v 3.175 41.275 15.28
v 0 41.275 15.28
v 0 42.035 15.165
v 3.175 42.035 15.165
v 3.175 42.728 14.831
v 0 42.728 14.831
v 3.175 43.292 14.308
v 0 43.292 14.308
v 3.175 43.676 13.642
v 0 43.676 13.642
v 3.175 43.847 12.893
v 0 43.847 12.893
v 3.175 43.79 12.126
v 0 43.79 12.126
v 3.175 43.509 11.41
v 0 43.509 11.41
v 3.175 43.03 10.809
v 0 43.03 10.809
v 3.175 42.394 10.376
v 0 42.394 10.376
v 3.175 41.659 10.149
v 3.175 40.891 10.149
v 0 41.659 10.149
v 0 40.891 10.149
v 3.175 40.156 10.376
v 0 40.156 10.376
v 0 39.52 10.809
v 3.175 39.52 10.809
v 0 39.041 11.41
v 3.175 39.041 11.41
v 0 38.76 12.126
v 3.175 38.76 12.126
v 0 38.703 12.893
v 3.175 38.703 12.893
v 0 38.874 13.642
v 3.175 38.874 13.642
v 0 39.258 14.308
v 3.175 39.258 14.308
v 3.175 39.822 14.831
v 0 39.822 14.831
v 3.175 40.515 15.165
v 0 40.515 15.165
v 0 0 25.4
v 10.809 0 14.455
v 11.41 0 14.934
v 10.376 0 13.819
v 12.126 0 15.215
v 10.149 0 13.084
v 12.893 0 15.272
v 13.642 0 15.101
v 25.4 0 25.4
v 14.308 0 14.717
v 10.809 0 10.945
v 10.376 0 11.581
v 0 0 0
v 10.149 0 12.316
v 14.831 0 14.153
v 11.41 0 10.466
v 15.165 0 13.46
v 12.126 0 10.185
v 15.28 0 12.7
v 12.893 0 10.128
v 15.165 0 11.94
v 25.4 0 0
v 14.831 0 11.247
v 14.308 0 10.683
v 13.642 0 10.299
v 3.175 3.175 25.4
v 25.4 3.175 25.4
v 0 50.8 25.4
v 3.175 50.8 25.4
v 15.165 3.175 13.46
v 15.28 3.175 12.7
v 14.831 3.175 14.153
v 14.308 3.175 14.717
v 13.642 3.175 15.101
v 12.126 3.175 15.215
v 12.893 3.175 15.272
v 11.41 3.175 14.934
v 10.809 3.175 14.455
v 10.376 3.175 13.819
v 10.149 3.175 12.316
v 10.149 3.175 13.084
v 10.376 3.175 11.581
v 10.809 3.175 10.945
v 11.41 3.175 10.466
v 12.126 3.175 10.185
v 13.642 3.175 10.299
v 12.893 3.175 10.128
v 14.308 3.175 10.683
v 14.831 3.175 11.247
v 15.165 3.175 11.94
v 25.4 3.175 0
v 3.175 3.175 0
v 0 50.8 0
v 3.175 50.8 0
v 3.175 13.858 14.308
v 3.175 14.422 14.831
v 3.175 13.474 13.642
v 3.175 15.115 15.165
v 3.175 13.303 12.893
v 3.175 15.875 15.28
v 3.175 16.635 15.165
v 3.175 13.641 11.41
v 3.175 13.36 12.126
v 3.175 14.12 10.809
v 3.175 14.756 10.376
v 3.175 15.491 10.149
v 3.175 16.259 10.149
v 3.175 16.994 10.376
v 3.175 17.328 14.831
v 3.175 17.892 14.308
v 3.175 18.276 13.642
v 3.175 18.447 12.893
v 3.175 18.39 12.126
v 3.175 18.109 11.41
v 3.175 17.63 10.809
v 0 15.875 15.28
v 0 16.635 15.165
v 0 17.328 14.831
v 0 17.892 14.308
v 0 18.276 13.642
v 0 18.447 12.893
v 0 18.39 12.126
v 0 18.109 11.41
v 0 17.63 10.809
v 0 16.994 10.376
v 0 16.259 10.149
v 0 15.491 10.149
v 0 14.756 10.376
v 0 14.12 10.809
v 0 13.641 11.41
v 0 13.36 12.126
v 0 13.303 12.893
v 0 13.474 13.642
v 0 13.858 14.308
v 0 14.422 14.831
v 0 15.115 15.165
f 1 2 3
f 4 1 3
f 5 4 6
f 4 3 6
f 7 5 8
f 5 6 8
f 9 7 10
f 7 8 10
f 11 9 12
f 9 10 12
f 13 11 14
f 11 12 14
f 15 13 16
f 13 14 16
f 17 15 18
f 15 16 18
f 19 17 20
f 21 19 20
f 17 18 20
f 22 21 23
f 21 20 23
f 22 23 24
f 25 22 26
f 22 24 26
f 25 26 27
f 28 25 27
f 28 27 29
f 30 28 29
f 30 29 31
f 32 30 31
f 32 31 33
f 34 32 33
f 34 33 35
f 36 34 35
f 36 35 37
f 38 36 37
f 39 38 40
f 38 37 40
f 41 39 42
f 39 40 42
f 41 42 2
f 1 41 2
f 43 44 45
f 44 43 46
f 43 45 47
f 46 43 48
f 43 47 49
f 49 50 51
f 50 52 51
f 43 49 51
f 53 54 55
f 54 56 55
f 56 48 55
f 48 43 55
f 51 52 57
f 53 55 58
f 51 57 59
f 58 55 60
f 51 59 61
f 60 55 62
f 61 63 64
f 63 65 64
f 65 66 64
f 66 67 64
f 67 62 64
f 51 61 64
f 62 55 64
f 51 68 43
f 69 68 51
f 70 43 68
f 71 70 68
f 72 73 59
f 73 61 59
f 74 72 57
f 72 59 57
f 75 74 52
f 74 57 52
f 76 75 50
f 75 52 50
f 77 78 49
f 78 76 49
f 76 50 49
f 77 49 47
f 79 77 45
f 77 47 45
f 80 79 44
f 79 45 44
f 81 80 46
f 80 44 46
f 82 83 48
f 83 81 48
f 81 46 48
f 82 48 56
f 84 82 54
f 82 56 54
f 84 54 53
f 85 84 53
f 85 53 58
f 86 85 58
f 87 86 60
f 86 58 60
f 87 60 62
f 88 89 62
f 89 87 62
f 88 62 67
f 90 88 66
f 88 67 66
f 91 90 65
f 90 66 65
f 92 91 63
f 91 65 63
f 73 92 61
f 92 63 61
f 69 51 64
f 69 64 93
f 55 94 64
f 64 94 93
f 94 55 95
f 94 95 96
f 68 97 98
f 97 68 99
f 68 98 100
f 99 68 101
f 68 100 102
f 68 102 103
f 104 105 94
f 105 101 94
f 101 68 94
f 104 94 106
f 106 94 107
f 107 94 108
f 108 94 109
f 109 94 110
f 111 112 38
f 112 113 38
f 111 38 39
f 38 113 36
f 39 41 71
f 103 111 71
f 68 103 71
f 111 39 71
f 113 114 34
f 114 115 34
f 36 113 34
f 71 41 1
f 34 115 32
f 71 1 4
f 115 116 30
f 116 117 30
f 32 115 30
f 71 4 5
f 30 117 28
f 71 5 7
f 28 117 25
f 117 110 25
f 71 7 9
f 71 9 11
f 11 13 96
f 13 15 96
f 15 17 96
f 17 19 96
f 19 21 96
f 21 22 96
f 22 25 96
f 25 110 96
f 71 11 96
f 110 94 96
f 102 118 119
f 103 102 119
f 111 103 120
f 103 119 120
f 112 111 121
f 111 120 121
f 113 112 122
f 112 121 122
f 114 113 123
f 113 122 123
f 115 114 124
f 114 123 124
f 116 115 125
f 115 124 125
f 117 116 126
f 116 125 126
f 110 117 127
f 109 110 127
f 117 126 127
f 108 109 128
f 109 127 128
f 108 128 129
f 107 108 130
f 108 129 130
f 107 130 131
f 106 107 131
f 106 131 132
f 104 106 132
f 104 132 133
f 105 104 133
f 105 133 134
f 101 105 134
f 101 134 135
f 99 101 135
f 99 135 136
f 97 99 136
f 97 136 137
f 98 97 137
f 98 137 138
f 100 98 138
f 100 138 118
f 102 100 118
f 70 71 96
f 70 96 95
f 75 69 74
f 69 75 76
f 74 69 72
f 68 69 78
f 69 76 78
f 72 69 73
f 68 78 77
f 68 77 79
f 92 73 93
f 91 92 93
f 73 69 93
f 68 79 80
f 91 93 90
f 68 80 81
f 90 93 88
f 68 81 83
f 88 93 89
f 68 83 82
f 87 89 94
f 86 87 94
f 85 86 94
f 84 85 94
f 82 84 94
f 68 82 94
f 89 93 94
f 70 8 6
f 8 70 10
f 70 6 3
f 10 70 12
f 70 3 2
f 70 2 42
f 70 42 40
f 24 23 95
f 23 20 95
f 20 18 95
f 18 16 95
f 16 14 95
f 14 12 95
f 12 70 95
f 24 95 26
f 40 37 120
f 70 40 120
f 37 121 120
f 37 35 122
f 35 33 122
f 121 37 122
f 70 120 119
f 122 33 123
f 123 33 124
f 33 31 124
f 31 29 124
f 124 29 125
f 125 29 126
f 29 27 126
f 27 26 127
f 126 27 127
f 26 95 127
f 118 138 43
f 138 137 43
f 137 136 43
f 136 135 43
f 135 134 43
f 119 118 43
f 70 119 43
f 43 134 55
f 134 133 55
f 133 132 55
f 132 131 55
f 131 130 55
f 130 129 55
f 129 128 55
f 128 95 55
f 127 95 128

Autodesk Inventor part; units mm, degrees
ref_plane "YZ Plane" through (0, 0, 0) normal (1, 0, 0) x (0, 1, 0)
ref_plane "XZ Plane" through (0, 0, 0) normal (0, 1, 0) x (-1, 0, 0)
ref_plane "XY Plane" through (0, 0, 0) normal (0, 0, 1) x (1, 0, 0)
sketch "Sketch1" plane through (0, 0, 0) normal (0, 0, 1) x (1, 0, 0)
  line L0 (0, 0) -> (3.175, 0)
  line L1 (3.175, 0) -> (3.175, 50.8)
  line L2 (3.175, 50.8) -> (0, 50.8)
  line L3 (0, 50.8) -> (0, 0)
  line L4 (0, 0) -> (25.4, 0)
  line L5 (25.4, 0) -> (25.4, 3.175)
  line L6 (25.4, 3.175) -> (0, 3.175)
  line L7 (0, 3.175) -> (0, 0)
  dimension "d0" = 3.175
  dimension "d1" = 50.8
  dimension "d2" = 25.4
  dimension "d3" = 3.175
extrude "Extrusion1" add sketch "Sketch1" along normal blind 25.4
sketch "Sketch2" plane through (0, 0, 0) normal (-1, 0, 0) x (0, 0, 1)
  line L0 (0, 0) -> (25.4, 0) projected
  line L1 (12.7, 0) -> (12.7, 15.875)
  line L2 (12.7, 15.875) -> (12.7, 41.275)
  circle A0 centre (12.7, 41.275) radius 2.5797
  circle A1 centre (12.7, 15.875) radius 2.5797
  dimension "d6" = 15.875
  dimension "d7" = 25.4
  dimension "d8" = 5.1594
  dimension "d9" = 5.1594
extrude "Extrusion2" cut sketch "Sketch2" against normal blind 25.4
sketch "Sketch3" plane through (0, 0, 0) normal (0, -1, 0) x (1, 0, 0)
  line L0 (0, 0) -> (0, 25.4) projected
  line L1 (0, 12.7) -> (12.7, 12.7)
  circle A0 centre (12.7, 12.7) radius 2.5797
  dimension "d12" = 12.7
  dimension "d13" = 5.1594
extrude "Extrusion3" cut sketch "Sketch3" against normal blind 25.4
properties part number "1x2 L Bracket"
